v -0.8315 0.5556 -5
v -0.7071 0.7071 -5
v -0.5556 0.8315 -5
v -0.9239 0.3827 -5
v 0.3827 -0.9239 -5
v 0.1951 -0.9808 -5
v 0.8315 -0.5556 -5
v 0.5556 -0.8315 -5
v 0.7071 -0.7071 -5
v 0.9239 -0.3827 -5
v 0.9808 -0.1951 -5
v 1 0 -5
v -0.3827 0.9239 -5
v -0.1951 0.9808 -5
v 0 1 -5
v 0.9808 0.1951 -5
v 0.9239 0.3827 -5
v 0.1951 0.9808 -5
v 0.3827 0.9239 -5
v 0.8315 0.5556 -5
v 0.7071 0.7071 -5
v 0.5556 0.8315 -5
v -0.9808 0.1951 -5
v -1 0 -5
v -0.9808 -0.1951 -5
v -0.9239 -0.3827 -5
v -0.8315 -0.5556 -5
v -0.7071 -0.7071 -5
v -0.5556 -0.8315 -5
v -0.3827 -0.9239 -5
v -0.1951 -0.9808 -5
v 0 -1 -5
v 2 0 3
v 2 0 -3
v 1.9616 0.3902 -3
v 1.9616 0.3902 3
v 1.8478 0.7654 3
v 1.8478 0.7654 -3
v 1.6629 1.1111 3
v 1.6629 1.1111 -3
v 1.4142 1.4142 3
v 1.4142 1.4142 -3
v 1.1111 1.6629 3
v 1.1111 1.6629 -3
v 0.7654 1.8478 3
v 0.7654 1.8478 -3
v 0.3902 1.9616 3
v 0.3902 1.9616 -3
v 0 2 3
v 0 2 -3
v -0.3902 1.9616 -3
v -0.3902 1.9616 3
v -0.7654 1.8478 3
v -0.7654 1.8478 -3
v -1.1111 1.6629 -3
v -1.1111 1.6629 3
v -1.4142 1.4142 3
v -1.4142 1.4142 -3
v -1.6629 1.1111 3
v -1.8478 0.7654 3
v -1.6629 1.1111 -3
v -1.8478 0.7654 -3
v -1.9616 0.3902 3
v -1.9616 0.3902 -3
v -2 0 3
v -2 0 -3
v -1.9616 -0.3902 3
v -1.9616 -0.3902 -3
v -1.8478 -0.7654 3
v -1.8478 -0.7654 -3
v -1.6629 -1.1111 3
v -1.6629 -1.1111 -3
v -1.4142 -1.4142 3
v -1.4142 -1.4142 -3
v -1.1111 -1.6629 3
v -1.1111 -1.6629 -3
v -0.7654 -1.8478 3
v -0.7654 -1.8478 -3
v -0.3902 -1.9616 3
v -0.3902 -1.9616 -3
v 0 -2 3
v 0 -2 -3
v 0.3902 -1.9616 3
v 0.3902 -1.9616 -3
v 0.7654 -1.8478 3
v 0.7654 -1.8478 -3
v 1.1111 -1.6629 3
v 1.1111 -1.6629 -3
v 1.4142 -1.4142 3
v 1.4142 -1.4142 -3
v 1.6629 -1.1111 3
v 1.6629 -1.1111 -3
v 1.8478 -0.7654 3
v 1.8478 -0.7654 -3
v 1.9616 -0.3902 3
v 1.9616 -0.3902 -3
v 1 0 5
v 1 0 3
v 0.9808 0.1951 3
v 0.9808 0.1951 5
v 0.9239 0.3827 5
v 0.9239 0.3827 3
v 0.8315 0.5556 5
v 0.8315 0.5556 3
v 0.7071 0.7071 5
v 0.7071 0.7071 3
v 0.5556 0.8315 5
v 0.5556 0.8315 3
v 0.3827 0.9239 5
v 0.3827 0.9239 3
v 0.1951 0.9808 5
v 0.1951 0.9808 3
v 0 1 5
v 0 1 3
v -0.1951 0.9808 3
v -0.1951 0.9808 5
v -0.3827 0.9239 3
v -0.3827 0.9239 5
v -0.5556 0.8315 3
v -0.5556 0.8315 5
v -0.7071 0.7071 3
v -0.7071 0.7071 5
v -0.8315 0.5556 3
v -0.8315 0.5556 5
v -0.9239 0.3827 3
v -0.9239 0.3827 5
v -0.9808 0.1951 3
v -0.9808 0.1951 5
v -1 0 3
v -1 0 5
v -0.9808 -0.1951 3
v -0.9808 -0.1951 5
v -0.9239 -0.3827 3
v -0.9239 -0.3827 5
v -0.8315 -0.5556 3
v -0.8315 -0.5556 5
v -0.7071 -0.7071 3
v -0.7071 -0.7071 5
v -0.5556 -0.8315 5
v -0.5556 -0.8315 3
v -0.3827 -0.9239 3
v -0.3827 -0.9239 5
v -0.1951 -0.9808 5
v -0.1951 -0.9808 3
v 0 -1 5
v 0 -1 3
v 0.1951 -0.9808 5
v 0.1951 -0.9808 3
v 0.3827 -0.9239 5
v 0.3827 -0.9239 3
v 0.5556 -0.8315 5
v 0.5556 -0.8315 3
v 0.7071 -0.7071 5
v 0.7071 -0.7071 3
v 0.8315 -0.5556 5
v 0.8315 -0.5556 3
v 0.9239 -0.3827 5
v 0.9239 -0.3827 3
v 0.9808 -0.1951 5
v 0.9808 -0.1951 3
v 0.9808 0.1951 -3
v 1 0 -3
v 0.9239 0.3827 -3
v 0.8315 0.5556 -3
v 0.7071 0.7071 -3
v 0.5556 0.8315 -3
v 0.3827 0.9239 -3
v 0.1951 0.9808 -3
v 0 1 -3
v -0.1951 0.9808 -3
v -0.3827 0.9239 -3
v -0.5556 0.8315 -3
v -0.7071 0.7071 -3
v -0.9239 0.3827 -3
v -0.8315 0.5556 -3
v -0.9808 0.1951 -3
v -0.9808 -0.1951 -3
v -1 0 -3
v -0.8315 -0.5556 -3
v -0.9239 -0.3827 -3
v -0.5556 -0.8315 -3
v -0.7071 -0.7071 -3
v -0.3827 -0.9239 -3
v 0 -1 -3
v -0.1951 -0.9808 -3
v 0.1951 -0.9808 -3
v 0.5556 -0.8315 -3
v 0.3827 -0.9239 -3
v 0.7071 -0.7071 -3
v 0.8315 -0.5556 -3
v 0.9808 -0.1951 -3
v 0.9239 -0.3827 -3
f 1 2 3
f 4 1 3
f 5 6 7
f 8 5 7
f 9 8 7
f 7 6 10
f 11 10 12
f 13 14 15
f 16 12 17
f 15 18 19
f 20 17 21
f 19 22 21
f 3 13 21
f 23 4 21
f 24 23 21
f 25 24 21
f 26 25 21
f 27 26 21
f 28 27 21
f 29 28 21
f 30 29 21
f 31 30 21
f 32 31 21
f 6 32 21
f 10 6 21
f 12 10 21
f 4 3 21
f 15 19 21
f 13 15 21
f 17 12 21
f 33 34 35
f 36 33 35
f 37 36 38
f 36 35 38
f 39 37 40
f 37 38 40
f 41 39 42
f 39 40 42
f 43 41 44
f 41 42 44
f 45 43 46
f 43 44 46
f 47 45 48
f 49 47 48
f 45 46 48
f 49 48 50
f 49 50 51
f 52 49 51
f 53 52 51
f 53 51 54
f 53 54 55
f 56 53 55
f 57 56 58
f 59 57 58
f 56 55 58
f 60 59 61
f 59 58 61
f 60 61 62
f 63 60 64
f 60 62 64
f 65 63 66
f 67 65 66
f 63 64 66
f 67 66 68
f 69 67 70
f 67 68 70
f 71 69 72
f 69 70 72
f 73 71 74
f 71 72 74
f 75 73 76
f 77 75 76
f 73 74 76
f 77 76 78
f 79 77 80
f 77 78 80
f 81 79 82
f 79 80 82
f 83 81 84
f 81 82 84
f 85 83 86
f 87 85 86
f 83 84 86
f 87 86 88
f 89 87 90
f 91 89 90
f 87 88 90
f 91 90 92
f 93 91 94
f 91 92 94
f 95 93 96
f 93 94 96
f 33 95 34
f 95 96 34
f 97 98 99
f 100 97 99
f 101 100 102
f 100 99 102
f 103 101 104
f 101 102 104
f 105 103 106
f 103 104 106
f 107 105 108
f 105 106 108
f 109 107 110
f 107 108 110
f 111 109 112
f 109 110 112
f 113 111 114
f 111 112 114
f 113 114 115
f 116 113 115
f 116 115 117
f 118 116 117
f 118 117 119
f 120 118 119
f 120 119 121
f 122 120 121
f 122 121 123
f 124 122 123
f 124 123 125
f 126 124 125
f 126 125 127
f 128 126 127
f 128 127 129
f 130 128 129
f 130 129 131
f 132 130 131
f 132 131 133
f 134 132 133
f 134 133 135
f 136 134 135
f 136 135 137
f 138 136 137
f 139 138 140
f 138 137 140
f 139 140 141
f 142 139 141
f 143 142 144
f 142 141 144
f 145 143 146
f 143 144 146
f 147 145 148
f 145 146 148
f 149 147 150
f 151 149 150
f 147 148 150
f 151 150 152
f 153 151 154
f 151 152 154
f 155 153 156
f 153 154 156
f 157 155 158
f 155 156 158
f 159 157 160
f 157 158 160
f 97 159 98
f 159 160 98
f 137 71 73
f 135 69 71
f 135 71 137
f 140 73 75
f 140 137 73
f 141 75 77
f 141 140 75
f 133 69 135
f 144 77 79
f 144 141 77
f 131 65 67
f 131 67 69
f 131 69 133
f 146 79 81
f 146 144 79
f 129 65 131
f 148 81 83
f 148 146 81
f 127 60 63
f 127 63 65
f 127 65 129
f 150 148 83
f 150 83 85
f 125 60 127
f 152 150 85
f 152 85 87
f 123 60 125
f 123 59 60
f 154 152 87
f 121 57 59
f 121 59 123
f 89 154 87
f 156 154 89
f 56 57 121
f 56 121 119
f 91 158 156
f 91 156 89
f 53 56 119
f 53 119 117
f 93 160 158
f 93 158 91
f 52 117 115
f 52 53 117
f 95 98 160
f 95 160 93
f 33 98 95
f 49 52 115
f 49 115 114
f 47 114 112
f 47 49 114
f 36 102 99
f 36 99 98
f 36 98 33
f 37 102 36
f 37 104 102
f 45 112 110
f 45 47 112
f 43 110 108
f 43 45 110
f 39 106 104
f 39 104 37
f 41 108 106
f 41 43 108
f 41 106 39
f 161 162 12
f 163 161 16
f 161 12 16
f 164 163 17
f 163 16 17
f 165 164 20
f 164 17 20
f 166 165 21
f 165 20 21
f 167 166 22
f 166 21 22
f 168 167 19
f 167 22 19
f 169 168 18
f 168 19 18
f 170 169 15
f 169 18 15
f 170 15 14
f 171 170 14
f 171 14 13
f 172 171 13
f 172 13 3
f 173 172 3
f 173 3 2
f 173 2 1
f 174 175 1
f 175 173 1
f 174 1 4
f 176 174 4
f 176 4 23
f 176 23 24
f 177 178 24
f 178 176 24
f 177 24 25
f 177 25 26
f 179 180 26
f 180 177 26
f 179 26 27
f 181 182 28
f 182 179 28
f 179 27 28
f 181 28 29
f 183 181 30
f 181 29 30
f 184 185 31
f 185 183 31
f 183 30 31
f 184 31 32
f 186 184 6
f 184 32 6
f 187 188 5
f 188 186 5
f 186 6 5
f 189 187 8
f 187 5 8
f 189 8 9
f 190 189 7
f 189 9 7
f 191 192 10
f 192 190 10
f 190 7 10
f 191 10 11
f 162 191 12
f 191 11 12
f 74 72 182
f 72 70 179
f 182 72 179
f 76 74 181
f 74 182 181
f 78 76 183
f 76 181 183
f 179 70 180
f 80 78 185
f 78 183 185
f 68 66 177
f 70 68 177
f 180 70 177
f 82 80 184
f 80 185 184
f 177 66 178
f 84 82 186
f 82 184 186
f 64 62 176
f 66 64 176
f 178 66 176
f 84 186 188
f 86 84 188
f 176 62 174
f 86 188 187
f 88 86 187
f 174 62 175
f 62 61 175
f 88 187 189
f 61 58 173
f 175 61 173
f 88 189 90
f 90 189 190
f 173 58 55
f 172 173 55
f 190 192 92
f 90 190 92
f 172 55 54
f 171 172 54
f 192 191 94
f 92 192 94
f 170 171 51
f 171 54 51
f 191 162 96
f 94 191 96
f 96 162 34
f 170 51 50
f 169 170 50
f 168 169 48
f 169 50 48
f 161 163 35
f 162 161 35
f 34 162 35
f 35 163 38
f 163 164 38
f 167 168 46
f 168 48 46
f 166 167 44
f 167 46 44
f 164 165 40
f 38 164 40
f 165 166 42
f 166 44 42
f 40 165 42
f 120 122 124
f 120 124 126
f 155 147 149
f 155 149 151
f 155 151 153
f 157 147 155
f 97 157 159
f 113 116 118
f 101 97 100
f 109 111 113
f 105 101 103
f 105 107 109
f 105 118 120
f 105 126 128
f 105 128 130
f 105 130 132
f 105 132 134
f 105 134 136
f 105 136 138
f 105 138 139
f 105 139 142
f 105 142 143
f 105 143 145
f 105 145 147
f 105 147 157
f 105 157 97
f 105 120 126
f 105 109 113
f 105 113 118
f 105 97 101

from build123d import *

# Parameters (mm, degrees)
SALIENTE_EXTRUIR1_DEPTH      = 5
SALIENTE_EXTRUIR1_DEPTH_BACK = 5
CROQUIS1_R                   = 1
SALIENTE_EXTRUIR2_DEPTH      = 3
SALIENTE_EXTRUIR2_DEPTH_BACK = 3
CROQUIS2_R                   = 2


with BuildPart() as part:
    # Croquis1 → Saliente-Extruir1 (new, two sides: drawn at the far end of the back side and taken through both)
    with BuildSketch(Plane.XY.offset(-SALIENTE_EXTRUIR1_DEPTH_BACK)):
        Circle(CROQUIS1_R)
    extrude(amount=SALIENTE_EXTRUIR1_DEPTH + SALIENTE_EXTRUIR1_DEPTH_BACK)

    # Croquis2 → Saliente-Extruir2 (add, two sides: drawn at the far end of the back side and taken through both)
    with BuildSketch(Plane.XY.offset(-SALIENTE_EXTRUIR2_DEPTH_BACK)):
        Circle(CROQUIS2_R)
    extrude(amount=SALIENTE_EXTRUIR2_DEPTH + SALIENTE_EXTRUIR2_DEPTH_BACK)


solid = part.part
